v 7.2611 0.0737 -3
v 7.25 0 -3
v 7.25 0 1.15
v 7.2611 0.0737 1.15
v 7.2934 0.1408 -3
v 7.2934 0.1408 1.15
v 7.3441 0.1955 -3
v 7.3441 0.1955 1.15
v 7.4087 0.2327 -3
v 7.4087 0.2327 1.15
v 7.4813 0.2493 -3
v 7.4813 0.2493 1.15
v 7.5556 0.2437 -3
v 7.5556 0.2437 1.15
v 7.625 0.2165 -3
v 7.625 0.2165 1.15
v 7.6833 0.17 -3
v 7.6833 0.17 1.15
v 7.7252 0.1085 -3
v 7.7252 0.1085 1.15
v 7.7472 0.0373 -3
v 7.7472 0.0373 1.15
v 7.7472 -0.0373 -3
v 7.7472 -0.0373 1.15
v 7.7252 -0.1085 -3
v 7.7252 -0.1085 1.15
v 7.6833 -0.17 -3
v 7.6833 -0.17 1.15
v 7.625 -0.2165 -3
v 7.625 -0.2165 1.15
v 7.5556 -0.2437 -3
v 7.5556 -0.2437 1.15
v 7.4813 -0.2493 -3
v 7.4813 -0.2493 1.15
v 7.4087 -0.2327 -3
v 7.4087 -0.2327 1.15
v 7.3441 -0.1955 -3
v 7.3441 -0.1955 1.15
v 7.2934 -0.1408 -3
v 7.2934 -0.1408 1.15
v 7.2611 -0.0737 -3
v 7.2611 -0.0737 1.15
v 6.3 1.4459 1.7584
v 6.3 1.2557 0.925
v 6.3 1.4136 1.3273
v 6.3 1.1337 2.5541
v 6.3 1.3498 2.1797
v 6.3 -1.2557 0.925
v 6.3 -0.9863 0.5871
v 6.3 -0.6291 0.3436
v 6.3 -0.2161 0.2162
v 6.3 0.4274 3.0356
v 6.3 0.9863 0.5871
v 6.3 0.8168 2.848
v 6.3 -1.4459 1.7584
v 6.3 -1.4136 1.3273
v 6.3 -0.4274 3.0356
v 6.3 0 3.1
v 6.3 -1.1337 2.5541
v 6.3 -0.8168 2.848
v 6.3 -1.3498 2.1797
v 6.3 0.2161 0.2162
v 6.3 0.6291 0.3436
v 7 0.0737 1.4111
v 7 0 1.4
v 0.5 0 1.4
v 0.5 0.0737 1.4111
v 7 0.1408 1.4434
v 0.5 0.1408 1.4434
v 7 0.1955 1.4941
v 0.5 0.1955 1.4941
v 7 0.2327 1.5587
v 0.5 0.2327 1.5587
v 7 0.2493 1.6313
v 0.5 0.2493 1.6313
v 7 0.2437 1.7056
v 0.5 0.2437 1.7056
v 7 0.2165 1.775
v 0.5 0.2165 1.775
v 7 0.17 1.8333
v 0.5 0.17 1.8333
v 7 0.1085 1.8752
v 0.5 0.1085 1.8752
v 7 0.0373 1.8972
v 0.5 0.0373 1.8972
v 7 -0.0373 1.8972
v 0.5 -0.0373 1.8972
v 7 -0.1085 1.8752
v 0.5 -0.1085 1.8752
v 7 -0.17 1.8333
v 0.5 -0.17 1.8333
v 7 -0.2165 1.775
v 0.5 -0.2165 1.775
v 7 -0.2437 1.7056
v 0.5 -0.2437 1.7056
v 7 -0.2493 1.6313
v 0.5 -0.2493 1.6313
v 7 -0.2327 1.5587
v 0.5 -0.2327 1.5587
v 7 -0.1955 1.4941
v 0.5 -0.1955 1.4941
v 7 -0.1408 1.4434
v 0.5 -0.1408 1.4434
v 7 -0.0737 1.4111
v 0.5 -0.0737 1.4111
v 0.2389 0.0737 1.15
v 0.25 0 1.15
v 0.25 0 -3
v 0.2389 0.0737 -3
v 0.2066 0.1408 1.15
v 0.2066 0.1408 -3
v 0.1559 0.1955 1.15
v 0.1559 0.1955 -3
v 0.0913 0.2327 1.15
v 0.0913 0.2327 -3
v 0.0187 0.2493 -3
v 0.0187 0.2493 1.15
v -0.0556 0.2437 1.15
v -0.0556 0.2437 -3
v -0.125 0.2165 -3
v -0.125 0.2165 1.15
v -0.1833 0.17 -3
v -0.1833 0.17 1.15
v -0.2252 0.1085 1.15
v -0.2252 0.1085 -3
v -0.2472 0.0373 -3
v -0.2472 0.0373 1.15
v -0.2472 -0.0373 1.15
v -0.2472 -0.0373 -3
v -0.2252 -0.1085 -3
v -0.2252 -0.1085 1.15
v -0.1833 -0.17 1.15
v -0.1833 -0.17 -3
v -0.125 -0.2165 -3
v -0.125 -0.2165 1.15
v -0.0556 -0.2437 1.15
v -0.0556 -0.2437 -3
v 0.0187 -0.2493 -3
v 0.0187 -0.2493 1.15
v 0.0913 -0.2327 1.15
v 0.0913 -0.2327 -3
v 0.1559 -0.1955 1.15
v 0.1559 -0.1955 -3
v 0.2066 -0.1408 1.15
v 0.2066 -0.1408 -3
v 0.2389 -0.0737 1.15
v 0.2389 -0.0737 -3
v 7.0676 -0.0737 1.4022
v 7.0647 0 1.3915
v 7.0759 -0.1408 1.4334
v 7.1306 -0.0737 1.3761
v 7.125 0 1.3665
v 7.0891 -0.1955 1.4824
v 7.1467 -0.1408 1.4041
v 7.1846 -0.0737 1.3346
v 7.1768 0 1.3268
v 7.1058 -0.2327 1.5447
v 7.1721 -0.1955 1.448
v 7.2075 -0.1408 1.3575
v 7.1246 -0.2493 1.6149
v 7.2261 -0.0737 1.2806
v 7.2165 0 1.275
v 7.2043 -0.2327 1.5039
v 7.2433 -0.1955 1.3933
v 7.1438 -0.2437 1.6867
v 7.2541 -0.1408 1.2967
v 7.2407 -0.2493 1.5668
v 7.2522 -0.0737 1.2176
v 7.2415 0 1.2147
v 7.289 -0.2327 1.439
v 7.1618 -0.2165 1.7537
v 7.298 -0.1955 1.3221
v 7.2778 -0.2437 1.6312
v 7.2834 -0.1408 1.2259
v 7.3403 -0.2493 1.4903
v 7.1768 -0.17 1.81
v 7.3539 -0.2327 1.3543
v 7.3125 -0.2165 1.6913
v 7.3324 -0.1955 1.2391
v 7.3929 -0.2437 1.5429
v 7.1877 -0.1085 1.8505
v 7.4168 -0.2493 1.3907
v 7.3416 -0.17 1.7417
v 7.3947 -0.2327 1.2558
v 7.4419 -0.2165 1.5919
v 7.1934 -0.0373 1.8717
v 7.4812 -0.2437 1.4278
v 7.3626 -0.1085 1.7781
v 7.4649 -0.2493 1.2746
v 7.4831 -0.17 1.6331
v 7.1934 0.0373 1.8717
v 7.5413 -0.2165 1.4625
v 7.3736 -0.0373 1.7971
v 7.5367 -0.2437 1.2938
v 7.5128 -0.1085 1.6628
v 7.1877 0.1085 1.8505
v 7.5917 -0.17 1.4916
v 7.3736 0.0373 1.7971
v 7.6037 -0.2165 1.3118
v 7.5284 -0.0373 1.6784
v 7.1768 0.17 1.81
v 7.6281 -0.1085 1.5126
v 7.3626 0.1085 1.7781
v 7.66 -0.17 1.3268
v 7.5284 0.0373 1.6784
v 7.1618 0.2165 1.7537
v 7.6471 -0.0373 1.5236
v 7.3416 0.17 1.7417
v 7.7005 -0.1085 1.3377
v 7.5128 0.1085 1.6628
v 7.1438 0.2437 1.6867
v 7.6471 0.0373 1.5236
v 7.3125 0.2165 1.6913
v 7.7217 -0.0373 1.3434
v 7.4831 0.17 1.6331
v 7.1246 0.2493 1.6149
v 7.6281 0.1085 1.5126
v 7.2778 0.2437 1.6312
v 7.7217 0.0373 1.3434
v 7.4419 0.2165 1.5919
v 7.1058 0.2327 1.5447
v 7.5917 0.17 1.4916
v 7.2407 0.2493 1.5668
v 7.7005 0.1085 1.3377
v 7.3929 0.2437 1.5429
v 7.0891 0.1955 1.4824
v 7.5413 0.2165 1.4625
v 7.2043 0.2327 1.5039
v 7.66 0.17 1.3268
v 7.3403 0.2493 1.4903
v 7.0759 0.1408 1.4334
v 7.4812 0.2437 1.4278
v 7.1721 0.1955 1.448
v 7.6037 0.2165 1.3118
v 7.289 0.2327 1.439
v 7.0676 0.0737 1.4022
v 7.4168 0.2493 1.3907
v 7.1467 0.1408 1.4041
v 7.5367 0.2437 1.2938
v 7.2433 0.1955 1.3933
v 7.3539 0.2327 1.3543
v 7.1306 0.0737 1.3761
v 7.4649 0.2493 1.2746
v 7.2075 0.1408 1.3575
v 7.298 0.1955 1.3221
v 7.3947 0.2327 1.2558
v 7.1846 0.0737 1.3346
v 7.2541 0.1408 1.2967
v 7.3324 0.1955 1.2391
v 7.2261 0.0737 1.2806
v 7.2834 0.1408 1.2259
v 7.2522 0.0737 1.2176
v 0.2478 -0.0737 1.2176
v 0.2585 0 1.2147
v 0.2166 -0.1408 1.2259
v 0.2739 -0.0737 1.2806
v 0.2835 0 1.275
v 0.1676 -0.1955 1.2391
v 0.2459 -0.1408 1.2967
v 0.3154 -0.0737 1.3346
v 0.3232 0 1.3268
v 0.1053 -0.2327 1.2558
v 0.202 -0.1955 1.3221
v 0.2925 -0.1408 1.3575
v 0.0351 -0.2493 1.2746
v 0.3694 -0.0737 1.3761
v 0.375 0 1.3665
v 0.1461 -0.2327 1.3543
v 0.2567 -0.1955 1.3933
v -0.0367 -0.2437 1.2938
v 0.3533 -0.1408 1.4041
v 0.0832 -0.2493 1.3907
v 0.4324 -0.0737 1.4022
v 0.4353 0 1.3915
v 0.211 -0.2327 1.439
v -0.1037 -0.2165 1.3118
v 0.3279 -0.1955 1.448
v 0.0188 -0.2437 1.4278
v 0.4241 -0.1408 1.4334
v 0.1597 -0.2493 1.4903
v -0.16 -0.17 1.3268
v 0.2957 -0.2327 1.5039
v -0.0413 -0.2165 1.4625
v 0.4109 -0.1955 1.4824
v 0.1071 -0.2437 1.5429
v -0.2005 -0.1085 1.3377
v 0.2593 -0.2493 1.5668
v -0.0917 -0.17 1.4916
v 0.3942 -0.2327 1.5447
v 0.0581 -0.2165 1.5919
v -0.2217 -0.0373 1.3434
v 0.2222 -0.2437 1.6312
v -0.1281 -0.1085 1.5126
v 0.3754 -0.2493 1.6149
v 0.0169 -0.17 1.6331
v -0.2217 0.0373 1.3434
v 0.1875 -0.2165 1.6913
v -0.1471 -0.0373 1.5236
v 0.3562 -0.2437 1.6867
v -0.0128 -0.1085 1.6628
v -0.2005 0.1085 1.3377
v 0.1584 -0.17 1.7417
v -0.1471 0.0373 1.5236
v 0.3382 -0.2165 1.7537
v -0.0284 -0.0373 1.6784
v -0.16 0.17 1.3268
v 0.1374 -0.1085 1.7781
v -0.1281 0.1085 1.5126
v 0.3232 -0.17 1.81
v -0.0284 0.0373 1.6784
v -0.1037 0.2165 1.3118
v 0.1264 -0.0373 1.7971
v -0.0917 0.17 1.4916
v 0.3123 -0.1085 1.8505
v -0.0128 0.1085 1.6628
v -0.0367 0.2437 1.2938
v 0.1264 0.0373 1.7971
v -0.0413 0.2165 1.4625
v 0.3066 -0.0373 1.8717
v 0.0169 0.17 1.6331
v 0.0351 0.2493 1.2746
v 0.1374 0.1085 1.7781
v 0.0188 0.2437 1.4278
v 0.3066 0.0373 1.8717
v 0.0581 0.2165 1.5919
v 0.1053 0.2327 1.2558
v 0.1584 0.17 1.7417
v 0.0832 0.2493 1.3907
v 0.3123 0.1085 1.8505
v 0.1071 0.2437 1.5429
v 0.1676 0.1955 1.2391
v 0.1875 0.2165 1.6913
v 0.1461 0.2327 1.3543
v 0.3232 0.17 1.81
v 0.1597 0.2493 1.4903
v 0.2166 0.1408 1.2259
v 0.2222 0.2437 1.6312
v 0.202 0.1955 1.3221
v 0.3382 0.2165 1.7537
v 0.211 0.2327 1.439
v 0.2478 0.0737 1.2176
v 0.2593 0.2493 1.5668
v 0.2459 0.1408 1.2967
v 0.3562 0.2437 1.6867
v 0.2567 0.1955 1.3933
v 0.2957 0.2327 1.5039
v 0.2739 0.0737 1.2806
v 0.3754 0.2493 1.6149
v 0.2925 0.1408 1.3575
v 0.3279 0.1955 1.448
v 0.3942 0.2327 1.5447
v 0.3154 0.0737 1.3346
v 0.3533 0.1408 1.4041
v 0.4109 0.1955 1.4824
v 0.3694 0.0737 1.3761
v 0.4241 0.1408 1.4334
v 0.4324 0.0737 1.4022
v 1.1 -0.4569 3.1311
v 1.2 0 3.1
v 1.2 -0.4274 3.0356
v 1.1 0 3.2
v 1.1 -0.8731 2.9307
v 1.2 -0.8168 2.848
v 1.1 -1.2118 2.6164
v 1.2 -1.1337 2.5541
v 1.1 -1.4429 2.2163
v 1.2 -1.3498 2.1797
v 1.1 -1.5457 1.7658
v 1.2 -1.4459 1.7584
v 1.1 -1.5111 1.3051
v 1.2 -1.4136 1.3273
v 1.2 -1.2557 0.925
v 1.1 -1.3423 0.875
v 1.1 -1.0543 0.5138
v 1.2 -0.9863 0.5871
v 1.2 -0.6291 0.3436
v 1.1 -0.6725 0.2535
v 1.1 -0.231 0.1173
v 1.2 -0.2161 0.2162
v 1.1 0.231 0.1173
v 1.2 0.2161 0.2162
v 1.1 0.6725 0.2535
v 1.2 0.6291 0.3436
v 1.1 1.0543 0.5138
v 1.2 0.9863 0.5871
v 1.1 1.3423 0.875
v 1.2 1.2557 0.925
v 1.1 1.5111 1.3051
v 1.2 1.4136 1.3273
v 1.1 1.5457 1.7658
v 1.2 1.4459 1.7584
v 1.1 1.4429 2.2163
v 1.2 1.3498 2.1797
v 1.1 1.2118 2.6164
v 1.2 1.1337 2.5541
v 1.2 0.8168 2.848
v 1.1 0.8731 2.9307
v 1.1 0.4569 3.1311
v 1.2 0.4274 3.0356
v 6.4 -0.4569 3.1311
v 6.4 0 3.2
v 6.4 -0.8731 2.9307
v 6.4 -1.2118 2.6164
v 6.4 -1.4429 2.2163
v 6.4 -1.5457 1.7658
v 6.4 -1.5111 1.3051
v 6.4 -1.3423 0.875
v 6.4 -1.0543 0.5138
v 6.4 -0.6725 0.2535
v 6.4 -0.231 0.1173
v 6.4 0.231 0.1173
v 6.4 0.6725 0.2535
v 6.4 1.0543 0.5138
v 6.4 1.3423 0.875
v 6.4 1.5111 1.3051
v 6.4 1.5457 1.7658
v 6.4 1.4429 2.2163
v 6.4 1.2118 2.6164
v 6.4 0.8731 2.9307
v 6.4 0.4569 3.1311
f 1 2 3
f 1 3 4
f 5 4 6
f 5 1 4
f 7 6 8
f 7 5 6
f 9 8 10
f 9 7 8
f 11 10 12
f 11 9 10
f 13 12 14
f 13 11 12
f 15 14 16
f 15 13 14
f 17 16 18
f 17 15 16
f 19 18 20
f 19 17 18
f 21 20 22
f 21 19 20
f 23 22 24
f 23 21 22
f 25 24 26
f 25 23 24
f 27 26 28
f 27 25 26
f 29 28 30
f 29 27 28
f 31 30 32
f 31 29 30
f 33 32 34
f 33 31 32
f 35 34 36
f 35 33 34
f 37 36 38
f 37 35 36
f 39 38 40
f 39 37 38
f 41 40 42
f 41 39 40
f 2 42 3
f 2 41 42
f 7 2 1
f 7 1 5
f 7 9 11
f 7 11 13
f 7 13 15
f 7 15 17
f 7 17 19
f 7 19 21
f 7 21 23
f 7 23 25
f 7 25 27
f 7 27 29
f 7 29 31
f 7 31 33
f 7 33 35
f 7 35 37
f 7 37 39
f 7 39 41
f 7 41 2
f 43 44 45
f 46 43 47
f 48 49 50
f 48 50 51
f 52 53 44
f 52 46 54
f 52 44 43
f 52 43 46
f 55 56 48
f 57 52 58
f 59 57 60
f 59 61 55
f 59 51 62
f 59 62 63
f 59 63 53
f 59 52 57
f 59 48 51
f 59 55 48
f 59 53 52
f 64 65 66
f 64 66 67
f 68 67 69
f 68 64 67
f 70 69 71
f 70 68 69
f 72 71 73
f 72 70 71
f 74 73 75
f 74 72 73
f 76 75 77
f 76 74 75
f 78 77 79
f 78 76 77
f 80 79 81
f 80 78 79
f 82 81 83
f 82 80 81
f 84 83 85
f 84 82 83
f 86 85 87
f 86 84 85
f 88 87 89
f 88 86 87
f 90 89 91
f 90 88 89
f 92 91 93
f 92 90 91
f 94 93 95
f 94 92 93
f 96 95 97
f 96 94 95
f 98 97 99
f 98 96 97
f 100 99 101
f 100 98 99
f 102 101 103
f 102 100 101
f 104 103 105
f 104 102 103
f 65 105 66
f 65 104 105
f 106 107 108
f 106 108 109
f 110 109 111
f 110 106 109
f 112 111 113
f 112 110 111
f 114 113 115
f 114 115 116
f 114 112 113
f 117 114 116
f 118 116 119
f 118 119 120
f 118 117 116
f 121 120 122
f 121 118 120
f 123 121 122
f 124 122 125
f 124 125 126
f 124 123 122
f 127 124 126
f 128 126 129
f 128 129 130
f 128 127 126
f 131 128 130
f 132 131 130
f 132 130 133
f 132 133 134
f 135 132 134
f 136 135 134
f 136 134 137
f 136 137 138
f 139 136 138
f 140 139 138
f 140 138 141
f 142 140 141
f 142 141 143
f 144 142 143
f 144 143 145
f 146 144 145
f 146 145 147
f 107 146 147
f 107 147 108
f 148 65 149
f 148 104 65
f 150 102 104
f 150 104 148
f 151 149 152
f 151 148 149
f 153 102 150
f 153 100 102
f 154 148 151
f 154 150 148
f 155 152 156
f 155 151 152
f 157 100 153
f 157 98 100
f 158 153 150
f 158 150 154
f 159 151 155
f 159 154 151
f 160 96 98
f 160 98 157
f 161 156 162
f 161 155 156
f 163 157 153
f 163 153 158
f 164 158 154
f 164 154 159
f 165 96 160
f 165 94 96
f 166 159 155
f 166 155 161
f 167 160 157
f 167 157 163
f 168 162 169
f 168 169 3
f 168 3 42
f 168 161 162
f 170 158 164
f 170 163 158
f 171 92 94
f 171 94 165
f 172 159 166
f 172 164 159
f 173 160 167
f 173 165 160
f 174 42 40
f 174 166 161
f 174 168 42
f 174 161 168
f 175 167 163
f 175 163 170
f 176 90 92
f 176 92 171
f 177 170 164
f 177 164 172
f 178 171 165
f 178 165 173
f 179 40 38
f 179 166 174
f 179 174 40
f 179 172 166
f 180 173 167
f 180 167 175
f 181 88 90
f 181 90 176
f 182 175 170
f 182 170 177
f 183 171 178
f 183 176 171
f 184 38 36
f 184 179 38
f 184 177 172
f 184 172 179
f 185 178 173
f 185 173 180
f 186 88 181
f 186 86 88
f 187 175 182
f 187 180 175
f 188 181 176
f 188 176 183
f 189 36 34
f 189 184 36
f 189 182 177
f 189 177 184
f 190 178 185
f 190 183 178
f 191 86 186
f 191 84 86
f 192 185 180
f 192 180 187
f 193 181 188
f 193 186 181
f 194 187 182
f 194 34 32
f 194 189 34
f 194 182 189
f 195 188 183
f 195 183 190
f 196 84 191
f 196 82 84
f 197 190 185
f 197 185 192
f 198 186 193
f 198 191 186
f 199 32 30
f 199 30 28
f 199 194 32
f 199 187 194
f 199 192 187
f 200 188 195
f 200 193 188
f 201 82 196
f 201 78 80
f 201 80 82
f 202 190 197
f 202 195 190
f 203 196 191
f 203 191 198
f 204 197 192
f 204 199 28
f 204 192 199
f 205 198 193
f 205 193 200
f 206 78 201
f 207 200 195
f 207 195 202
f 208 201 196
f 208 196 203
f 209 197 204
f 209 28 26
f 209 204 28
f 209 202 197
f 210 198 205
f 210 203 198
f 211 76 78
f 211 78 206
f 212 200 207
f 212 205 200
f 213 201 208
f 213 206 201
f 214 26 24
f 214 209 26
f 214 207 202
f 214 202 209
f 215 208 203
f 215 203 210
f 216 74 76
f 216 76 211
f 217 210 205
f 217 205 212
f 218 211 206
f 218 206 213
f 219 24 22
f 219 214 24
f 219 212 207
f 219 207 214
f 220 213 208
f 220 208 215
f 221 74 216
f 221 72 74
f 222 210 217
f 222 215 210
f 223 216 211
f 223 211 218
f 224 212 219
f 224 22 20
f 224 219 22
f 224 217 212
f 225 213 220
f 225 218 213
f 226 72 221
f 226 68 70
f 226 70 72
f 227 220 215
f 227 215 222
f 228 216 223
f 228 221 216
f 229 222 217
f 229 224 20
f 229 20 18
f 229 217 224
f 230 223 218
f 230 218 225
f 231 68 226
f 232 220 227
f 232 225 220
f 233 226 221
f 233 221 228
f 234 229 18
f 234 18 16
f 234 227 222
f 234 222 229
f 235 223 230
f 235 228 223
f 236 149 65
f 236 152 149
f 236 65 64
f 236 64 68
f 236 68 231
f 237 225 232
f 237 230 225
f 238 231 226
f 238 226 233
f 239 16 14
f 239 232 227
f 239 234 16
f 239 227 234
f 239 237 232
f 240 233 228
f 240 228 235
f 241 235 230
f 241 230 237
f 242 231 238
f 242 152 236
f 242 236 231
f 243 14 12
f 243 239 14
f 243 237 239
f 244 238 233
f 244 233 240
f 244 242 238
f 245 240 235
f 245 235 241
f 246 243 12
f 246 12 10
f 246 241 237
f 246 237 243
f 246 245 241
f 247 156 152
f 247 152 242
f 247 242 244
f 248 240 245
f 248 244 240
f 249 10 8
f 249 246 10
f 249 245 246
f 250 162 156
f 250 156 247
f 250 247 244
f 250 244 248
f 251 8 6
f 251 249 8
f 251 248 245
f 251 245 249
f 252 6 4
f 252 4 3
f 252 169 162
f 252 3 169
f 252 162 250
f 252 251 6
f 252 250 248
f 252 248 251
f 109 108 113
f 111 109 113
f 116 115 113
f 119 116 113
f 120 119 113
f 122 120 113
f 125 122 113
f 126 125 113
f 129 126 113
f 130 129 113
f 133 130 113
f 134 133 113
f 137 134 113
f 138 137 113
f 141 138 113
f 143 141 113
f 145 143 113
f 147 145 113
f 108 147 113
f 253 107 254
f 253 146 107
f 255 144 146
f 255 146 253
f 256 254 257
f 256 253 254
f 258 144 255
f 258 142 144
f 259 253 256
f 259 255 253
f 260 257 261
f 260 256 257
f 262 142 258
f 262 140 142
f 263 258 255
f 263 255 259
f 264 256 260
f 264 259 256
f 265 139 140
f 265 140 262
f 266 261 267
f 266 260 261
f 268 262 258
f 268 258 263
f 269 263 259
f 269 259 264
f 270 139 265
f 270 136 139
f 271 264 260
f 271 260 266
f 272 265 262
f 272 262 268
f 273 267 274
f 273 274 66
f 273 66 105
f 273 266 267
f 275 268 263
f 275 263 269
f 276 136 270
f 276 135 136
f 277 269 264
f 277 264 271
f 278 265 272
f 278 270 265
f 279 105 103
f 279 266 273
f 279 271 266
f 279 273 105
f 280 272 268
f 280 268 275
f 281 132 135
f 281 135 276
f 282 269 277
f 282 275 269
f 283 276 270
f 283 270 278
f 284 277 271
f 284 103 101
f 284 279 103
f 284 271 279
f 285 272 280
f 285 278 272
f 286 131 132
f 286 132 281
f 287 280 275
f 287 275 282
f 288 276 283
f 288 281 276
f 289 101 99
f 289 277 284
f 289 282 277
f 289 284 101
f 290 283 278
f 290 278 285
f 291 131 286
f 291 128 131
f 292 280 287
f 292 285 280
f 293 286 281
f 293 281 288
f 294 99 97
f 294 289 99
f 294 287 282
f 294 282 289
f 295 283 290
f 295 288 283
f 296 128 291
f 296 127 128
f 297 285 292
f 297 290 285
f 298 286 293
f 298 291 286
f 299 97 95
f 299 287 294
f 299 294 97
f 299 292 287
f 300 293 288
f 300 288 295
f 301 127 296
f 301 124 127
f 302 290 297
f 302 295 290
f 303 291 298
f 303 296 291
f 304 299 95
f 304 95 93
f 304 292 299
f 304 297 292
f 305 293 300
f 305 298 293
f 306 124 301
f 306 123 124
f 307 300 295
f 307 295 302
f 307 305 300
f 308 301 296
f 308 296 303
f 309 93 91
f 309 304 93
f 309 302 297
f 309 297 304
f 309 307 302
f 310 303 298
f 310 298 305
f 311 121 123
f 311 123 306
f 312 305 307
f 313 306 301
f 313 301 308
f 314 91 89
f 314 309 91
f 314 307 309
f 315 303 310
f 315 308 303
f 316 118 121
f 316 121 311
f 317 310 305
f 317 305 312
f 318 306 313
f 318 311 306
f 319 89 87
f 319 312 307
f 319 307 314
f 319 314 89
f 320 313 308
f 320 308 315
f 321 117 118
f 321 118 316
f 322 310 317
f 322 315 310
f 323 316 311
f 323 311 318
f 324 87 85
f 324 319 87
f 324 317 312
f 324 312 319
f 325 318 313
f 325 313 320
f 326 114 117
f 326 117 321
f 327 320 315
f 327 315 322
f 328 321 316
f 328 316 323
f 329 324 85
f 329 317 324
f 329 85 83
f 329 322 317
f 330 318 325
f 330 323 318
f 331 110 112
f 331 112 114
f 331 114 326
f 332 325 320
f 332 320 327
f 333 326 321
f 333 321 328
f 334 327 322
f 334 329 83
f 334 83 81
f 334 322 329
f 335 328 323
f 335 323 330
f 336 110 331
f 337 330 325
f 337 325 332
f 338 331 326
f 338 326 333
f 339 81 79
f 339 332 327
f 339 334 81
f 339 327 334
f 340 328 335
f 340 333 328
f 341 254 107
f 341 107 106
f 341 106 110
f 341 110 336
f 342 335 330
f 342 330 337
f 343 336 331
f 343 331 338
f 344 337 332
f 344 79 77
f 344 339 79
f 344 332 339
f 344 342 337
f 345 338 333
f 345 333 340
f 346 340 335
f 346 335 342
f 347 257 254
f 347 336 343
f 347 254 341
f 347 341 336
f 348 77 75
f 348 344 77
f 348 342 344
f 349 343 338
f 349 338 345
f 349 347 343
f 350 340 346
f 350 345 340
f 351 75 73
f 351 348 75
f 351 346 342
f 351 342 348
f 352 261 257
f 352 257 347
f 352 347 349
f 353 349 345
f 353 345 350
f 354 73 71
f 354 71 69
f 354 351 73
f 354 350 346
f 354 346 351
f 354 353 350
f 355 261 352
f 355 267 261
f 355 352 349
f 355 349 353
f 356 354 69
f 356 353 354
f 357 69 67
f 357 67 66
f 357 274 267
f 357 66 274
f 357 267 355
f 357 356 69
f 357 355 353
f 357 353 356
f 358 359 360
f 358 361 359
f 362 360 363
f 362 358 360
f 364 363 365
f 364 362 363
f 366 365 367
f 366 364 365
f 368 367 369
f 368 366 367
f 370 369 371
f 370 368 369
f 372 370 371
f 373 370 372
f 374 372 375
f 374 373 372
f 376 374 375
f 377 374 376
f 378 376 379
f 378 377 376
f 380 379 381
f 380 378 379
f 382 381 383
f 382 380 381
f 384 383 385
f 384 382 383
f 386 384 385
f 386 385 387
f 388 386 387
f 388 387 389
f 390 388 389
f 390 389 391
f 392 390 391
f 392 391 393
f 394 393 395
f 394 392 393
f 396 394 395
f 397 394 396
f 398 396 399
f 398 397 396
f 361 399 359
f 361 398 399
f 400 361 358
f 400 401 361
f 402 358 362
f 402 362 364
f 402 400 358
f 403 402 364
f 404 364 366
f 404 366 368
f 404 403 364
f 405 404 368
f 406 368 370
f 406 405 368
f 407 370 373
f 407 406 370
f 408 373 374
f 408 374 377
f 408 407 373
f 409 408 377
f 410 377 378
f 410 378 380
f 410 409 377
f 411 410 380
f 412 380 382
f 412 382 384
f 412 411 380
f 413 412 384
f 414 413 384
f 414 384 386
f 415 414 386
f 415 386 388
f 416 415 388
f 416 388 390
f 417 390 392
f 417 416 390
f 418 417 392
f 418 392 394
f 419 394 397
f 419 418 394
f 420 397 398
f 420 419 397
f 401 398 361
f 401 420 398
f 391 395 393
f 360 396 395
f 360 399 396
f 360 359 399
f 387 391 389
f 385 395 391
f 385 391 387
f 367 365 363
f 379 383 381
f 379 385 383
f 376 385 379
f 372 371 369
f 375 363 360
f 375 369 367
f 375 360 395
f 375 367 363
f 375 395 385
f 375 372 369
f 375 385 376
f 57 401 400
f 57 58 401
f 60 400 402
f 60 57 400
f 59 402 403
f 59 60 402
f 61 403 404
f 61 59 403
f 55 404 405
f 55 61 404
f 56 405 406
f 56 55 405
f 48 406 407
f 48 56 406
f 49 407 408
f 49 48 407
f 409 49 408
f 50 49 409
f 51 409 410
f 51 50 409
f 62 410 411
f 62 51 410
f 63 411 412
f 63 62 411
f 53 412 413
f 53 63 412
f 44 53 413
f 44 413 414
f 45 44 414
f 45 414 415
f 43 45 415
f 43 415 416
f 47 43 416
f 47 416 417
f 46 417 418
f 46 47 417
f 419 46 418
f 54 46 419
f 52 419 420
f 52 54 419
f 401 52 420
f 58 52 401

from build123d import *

# Parameters (mm, degrees)
SKETCH_R = 0.25


with BuildPart() as sweep_body:
    # Sweep: sweep along a path in Sketch001
    with BuildLine(Plane.XZ) as sweep_path:
        Line((0, -3), (0, 1.15))
        ThreePointArc((0, 1.15), (0.146449, 1.503555), (0.500006, 1.65))
        Line((0.500006, 1.65), (7, 1.65))
        ThreePointArc((7, 1.65), (7.353553, 1.503553), (7.5, 1.15))
        Line((7.5, 1.15), (7.5, -3))
    # Sketch → Sweep (sweep)
    with BuildSketch(Plane.XY.offset(-2)):
        Circle(SKETCH_R)
    sweep(path=sweep_path.line)


with BuildPart() as revolution:
    # Sketch002 → Revolution (revolve)
    with BuildSketch(Plane.XZ):
        Polygon((1.1, 3.2), (6.4, 3.2), (6.3, 3.1), (6.3, 1.65), (1.2, 1.65), (1.2, 3.1), align=None)
    revolve(axis=Axis((7.611803, 0, 1.65), (1, 0, 0)))


solid = Compound([sweep_body.part, revolution.part])
